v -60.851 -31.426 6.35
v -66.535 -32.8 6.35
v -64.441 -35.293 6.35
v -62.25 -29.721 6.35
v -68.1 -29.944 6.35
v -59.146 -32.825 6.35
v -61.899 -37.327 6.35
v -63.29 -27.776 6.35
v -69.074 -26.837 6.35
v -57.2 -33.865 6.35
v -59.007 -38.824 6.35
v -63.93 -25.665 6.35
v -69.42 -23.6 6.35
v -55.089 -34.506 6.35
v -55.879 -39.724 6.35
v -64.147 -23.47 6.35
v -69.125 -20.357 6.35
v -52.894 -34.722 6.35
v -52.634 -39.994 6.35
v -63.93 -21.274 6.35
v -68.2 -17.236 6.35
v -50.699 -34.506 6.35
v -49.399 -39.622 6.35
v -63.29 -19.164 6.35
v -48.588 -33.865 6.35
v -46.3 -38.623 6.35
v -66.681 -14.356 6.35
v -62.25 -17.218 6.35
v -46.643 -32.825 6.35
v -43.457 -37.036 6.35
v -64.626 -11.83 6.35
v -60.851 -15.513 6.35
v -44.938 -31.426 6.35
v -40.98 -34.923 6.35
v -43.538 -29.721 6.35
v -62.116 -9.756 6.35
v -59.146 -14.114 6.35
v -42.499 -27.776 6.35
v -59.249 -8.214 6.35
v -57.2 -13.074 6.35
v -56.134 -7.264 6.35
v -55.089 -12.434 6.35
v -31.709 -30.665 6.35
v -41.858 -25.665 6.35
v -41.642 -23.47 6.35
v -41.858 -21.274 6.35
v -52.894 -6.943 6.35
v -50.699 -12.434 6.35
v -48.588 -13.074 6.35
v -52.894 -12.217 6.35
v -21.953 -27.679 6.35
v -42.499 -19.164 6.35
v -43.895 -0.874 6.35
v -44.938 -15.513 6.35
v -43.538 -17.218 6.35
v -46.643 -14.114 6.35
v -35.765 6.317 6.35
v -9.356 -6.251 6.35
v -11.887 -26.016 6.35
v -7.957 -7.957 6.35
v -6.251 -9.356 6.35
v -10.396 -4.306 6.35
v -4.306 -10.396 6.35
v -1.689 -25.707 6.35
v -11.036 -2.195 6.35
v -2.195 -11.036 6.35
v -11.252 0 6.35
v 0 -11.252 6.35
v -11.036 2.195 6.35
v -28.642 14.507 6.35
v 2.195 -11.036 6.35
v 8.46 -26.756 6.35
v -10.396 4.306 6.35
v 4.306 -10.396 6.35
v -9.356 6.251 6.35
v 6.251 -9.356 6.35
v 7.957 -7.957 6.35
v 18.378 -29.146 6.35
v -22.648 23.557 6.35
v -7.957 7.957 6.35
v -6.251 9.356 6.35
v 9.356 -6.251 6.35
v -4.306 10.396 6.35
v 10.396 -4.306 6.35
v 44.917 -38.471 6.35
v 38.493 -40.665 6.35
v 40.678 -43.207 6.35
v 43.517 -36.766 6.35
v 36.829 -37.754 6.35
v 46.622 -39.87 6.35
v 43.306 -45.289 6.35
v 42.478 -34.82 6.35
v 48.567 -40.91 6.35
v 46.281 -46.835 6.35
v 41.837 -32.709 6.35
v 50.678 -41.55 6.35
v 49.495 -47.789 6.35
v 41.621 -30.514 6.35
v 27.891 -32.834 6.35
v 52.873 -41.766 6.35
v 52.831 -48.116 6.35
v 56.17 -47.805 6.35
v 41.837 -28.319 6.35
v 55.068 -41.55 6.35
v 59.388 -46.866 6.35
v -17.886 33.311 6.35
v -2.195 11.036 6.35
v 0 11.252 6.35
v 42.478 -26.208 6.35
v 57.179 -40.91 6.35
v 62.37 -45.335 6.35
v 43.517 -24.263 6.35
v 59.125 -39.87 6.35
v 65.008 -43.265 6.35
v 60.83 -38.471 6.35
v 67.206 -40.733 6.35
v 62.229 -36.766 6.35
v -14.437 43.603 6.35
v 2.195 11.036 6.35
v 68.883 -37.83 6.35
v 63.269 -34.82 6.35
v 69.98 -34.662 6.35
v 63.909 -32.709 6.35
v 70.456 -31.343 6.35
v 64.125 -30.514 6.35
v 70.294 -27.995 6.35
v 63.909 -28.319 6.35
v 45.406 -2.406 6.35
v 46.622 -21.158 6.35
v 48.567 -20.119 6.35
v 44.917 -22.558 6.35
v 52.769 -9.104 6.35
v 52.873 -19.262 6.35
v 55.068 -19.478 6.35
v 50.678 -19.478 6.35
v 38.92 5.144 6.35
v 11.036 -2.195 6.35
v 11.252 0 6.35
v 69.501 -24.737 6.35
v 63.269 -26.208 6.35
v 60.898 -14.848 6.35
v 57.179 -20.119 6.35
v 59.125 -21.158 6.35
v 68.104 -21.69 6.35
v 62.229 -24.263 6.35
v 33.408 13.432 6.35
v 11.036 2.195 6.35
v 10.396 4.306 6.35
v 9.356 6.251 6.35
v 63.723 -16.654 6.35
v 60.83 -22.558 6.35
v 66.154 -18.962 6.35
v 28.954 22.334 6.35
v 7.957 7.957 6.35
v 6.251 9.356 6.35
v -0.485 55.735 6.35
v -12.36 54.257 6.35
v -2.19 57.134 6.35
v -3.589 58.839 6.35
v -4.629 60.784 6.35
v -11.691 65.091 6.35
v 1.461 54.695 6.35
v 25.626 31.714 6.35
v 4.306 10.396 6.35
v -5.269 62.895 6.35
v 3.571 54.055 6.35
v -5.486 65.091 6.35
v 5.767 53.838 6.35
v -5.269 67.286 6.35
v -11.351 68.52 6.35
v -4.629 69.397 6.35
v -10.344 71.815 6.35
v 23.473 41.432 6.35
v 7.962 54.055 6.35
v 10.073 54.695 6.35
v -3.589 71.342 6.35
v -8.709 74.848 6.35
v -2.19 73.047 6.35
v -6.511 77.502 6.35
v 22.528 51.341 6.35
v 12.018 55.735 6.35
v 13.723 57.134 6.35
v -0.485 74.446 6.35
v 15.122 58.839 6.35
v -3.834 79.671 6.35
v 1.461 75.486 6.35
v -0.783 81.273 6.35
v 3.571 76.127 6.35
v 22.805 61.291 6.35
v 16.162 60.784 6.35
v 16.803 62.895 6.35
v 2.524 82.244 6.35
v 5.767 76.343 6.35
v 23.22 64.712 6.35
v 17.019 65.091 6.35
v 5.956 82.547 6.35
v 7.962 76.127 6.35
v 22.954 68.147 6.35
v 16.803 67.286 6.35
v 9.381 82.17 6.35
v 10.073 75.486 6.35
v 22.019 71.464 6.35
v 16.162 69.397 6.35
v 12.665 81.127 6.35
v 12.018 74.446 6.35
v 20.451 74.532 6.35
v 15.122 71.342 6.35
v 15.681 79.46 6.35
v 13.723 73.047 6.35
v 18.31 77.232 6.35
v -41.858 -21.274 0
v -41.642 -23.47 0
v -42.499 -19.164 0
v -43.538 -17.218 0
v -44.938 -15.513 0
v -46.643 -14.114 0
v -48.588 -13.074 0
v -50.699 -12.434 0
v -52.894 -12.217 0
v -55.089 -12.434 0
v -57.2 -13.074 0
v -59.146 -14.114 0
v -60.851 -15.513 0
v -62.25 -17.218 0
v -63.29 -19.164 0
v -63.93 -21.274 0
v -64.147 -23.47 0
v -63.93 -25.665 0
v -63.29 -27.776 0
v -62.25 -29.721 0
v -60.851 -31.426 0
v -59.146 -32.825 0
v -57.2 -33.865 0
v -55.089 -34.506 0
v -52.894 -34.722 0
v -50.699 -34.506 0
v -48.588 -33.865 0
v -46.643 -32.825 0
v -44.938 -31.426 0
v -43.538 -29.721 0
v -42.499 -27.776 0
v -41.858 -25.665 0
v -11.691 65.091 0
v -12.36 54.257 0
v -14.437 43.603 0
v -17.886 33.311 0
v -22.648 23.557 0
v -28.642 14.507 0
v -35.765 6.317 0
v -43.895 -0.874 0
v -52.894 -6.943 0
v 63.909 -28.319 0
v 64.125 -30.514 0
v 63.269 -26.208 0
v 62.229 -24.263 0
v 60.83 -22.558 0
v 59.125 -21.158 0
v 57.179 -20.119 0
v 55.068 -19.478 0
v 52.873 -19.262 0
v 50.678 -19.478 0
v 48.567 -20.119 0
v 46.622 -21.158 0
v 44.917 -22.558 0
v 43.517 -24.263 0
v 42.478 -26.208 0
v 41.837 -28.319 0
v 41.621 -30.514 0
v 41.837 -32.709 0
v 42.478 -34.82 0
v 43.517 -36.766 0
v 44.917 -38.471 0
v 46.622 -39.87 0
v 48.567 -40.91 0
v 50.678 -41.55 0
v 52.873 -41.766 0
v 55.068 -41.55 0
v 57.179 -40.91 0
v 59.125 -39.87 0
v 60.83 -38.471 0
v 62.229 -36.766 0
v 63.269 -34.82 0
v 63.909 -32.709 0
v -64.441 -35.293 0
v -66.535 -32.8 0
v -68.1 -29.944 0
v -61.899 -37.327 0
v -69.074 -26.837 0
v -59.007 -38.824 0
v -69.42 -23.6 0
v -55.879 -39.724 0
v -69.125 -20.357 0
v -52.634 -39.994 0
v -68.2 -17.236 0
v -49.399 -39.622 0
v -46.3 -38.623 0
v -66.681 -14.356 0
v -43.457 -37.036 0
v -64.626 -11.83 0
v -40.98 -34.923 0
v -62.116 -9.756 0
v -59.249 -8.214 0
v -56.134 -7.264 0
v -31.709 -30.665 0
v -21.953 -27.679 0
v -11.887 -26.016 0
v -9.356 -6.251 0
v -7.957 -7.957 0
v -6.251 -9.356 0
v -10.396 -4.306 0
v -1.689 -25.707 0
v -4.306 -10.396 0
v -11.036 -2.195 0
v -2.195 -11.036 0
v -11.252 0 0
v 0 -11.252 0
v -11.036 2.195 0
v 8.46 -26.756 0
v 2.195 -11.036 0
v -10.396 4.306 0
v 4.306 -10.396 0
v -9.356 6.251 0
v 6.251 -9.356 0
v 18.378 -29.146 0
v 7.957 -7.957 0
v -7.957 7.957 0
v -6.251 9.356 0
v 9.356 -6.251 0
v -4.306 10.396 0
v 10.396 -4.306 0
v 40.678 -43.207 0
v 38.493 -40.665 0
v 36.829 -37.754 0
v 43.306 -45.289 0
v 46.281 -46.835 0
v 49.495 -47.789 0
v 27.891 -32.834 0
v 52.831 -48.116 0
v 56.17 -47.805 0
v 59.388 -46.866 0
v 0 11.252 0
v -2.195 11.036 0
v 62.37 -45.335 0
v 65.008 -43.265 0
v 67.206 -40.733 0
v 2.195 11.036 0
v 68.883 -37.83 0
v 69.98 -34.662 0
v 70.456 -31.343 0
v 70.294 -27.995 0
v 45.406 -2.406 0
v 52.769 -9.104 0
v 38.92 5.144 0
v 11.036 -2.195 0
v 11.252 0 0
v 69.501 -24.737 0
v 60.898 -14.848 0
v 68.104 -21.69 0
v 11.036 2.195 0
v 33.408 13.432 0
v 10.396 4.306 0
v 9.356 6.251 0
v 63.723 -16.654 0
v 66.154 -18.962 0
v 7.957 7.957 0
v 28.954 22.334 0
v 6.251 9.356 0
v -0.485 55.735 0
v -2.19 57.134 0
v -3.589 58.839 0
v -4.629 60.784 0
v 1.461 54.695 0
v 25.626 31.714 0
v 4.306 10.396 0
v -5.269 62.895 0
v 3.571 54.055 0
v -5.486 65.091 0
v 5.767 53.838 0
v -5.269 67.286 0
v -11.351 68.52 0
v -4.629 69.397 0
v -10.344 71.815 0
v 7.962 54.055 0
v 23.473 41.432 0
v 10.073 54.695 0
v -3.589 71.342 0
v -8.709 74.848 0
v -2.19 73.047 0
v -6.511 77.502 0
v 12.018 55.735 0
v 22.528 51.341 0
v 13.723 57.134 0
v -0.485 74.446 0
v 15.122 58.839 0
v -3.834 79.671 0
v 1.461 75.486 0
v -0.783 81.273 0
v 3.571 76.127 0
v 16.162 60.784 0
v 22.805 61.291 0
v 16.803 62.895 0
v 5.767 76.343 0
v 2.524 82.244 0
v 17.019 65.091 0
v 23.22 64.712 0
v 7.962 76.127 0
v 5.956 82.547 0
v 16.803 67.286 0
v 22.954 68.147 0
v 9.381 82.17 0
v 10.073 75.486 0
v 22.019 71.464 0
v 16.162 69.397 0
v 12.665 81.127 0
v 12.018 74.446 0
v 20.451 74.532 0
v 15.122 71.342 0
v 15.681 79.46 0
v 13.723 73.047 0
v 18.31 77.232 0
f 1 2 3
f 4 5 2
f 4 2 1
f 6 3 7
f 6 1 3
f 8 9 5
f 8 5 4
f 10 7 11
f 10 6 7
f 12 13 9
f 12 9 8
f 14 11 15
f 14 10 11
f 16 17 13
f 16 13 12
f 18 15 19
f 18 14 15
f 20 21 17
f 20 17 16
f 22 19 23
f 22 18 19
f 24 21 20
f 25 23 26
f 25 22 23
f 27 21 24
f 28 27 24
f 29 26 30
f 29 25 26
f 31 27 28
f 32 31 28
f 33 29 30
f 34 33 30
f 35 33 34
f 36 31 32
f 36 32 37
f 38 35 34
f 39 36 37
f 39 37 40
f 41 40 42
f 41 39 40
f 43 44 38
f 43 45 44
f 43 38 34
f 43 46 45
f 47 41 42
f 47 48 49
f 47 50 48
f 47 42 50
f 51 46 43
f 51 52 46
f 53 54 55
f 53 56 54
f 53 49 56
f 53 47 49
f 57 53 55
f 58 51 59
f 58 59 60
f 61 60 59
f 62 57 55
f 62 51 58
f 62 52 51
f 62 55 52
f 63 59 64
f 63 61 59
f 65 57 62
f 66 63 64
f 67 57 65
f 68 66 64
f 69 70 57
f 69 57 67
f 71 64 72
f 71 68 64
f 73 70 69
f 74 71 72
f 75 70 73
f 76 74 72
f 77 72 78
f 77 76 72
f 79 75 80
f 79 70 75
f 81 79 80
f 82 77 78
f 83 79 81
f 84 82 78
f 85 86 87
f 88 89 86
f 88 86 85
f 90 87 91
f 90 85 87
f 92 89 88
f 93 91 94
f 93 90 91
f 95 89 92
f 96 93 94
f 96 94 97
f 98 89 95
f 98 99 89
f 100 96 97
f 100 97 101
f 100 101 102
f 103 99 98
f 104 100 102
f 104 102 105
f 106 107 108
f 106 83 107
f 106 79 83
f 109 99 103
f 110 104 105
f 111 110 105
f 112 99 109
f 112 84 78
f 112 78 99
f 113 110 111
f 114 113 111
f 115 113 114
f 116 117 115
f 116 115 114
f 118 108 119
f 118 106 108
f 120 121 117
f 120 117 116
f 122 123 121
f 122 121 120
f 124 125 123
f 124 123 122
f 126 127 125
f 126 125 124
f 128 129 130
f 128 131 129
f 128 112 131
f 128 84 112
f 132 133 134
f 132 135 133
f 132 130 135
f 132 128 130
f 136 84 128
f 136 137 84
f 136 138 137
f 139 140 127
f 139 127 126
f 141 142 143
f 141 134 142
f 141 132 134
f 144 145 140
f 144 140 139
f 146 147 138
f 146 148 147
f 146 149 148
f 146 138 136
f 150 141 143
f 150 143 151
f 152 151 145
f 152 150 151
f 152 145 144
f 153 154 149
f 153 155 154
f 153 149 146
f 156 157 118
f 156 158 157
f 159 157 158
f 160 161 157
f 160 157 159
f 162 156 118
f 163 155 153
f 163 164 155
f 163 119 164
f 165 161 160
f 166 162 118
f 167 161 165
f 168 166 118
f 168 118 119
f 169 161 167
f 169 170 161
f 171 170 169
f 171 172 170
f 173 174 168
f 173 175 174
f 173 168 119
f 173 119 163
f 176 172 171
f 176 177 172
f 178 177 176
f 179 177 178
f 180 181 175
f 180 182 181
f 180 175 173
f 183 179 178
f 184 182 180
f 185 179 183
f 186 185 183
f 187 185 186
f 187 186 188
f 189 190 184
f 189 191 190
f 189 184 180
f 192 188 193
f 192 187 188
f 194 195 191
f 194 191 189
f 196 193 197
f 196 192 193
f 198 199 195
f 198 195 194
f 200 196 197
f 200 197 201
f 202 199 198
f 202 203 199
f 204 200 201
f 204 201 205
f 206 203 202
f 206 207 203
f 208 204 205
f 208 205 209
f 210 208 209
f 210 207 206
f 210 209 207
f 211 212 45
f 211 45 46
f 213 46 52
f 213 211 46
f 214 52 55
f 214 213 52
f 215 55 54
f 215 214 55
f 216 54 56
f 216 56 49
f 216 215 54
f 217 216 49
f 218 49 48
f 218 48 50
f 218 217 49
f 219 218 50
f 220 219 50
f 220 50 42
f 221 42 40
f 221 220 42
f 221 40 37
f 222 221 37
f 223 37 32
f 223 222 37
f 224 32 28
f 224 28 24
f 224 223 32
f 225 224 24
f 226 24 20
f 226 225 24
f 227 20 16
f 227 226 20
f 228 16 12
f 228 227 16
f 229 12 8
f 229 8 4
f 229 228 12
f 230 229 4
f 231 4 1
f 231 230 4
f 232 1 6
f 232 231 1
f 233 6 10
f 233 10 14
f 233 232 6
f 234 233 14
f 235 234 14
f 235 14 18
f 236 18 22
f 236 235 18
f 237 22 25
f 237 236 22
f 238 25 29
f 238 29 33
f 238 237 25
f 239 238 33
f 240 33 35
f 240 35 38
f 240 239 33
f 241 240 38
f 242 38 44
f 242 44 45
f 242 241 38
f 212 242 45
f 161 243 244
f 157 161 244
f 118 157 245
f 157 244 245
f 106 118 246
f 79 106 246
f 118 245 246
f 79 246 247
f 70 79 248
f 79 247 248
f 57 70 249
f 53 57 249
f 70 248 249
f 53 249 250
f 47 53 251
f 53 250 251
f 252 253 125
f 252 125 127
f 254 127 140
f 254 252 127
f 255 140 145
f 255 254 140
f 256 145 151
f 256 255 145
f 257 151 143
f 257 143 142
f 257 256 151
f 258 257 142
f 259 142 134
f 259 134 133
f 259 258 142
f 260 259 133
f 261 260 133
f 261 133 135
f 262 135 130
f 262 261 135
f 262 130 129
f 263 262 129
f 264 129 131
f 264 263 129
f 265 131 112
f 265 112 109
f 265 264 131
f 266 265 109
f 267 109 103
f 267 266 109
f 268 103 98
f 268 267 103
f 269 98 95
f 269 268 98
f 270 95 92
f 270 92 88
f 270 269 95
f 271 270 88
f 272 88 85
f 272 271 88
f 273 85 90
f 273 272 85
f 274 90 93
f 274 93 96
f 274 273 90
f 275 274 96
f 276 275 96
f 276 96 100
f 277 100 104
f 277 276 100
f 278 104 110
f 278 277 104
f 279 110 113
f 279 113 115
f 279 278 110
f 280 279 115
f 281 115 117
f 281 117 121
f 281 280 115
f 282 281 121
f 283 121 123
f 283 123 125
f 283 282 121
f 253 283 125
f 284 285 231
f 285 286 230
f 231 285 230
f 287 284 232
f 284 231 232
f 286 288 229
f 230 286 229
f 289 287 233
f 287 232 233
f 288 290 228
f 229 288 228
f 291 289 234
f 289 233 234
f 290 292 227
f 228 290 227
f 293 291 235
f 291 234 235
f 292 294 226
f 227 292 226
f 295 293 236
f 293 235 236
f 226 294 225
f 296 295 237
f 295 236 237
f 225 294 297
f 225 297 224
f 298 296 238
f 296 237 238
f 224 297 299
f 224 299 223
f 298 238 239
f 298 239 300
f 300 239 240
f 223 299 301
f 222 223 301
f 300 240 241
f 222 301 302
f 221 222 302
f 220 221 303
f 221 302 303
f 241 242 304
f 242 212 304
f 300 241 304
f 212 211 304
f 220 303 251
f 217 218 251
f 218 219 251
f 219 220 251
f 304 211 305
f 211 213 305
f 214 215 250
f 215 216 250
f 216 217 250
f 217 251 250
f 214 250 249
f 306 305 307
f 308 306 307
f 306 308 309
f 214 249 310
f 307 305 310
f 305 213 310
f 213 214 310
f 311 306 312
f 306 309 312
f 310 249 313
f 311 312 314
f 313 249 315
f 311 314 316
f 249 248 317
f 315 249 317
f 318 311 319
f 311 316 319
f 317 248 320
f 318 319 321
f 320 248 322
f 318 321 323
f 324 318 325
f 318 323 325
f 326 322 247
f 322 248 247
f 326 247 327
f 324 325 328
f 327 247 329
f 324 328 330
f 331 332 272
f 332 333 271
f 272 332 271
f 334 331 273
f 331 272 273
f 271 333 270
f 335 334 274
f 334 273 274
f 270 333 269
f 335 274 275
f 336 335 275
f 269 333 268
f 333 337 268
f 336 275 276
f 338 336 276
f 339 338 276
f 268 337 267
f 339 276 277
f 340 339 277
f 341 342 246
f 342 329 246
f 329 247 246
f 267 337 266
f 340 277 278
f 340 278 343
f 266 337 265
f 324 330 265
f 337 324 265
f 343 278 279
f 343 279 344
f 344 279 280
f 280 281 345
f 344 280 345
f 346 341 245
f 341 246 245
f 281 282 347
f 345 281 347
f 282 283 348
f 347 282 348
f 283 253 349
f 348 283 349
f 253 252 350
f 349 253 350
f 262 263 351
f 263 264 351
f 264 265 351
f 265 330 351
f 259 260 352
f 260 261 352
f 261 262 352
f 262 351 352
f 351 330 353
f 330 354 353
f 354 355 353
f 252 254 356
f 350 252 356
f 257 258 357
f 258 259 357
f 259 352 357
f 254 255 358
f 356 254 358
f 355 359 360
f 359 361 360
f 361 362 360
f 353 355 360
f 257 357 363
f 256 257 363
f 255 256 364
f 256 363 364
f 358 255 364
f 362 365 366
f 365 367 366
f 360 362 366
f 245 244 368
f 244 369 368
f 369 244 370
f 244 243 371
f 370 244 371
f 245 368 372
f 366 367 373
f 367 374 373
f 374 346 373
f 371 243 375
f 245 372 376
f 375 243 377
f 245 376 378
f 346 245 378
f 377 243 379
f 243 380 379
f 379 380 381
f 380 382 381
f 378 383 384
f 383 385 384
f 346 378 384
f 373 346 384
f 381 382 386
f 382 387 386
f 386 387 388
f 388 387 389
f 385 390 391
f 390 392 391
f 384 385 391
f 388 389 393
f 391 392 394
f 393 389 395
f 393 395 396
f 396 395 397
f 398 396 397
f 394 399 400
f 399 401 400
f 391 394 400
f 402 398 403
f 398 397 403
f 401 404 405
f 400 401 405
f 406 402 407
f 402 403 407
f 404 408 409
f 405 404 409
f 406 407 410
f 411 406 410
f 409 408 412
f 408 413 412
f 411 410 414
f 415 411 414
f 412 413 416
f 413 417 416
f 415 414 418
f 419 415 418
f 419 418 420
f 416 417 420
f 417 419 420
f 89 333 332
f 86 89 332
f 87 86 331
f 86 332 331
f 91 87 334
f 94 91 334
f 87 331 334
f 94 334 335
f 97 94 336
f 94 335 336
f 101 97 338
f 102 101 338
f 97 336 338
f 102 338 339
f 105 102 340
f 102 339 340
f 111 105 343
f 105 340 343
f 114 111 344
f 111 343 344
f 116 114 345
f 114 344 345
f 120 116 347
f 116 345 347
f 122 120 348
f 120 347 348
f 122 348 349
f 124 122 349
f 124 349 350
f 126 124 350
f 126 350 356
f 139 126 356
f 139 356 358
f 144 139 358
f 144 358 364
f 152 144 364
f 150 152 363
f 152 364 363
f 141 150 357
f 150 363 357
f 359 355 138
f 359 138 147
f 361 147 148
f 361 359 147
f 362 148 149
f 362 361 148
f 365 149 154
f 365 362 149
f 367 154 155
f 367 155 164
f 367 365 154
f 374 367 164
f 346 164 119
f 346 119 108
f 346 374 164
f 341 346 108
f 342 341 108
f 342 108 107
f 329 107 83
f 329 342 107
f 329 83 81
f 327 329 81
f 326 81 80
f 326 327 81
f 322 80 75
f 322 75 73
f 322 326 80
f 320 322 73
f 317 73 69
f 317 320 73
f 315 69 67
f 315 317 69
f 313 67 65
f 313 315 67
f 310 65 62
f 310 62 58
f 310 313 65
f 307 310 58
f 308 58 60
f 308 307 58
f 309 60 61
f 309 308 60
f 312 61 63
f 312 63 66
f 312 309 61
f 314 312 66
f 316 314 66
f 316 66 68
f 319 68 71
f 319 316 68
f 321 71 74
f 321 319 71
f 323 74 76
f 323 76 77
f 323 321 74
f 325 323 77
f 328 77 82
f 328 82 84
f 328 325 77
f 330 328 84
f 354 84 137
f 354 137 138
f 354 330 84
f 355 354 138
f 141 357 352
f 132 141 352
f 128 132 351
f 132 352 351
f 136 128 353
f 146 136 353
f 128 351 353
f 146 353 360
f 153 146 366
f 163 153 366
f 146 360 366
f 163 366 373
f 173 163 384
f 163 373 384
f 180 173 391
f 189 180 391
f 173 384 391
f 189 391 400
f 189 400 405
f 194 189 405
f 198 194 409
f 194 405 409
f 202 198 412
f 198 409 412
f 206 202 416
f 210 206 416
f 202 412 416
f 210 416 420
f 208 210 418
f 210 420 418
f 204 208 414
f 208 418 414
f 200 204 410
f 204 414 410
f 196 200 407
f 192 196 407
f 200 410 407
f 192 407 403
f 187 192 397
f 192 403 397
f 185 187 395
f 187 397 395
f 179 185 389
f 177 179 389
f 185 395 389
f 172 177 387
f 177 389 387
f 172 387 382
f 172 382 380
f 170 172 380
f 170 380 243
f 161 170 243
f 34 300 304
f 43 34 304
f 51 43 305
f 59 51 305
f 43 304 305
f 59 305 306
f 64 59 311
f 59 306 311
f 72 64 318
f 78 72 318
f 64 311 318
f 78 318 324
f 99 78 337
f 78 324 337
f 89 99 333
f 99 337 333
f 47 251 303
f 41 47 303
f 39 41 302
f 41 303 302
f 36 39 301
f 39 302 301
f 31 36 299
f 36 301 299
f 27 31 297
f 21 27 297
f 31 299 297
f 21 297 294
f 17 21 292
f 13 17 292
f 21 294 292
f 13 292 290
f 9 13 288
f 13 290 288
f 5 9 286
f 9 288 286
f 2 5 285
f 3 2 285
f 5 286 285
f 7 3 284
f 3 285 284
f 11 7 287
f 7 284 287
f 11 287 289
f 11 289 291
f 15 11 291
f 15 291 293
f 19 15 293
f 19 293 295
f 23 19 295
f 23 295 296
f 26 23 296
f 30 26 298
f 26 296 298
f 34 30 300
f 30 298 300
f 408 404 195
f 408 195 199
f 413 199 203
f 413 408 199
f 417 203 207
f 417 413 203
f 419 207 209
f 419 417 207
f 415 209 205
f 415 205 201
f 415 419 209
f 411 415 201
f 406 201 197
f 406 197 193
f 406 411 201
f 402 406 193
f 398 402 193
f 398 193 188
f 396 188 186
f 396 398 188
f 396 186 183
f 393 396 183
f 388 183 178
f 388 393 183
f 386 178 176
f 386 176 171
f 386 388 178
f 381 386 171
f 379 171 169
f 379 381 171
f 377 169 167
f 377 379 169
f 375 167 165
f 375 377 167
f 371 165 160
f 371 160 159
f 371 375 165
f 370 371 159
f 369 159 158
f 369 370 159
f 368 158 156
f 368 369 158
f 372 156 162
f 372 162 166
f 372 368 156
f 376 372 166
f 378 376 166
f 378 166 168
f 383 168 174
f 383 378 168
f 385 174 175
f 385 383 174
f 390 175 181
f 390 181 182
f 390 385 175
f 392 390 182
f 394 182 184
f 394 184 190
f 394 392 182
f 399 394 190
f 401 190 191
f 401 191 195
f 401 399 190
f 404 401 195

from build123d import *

# Parameters (mm, degrees)
F0_R     = 11.2522
F2_DEPTH = 6.35
F3_DEPTH = 6.35


with BuildPart() as f2:
    # F0 (on Top) → F2 (new body)
    with BuildSketch(Plane.XY):
        with BuildLine():
            ThreePointArc((-11.690817, 65.090521), (-22.647912, 23.556909), (-52.894301, -6.94317))
            ThreePointArc((-52.894301, -6.94317), (-68.099635, -29.944072), (-40.980367, -34.922929))
            ThreePointArc((-40.980367, -34.922929), (-1.688841, -25.706561), (36.828944, -37.754204))
            ThreePointArc((36.828944, -37.754204), (65.008077, -43.265125), (60.898233, -14.847824))
            ThreePointArc((60.898233, -14.847824), (31.044284, 17.814443), (22.80546, 61.290916))
            ThreePointArc((22.80546, 61.290916), (7.677868, 82.442972), (-11.690817, 65.090521))
        make_face()
        with Locations((-52.894301, -23.469558)):
            Circle(F0_R, mode=Mode.SUBTRACT)
        Circle(F0_R, mode=Mode.SUBTRACT)
        with Locations((52.873283, -30.514273)):
            Circle(F0_R, mode=Mode.SUBTRACT)
        with Locations((5.766576, 65.090521)):
            Circle(F0_R, mode=Mode.SUBTRACT)
    extrude(amount=F2_DEPTH)

    # F0 (on Top) → F3 (join)
    with BuildSketch(Plane.XY):
        with BuildLine():
            ThreePointArc((-11.690817, 65.090521), (-22.647912, 23.556909), (-52.894301, -6.94317))
            ThreePointArc((-52.894301, -6.94317), (-68.099635, -29.944072), (-40.980367, -34.922929))
            ThreePointArc((-40.980367, -34.922929), (-1.688841, -25.706561), (36.828944, -37.754204))
            ThreePointArc((36.828944, -37.754204), (65.008077, -43.265125), (60.898233, -14.847824))
            ThreePointArc((60.898233, -14.847824), (31.044284, 17.814443), (22.80546, 61.290916))
            ThreePointArc((22.80546, 61.290916), (7.677868, 82.442972), (-11.690817, 65.090521))
        make_face()
        with Locations((-52.894301, -23.469558)):
            Circle(F0_R, mode=Mode.SUBTRACT)
        Circle(F0_R, mode=Mode.SUBTRACT)
        with Locations((52.873283, -30.514273)):
            Circle(F0_R, mode=Mode.SUBTRACT)
        with Locations((5.766576, 65.090521)):
            Circle(F0_R, mode=Mode.SUBTRACT)
    extrude(amount=F3_DEPTH)


solid = f2.part
